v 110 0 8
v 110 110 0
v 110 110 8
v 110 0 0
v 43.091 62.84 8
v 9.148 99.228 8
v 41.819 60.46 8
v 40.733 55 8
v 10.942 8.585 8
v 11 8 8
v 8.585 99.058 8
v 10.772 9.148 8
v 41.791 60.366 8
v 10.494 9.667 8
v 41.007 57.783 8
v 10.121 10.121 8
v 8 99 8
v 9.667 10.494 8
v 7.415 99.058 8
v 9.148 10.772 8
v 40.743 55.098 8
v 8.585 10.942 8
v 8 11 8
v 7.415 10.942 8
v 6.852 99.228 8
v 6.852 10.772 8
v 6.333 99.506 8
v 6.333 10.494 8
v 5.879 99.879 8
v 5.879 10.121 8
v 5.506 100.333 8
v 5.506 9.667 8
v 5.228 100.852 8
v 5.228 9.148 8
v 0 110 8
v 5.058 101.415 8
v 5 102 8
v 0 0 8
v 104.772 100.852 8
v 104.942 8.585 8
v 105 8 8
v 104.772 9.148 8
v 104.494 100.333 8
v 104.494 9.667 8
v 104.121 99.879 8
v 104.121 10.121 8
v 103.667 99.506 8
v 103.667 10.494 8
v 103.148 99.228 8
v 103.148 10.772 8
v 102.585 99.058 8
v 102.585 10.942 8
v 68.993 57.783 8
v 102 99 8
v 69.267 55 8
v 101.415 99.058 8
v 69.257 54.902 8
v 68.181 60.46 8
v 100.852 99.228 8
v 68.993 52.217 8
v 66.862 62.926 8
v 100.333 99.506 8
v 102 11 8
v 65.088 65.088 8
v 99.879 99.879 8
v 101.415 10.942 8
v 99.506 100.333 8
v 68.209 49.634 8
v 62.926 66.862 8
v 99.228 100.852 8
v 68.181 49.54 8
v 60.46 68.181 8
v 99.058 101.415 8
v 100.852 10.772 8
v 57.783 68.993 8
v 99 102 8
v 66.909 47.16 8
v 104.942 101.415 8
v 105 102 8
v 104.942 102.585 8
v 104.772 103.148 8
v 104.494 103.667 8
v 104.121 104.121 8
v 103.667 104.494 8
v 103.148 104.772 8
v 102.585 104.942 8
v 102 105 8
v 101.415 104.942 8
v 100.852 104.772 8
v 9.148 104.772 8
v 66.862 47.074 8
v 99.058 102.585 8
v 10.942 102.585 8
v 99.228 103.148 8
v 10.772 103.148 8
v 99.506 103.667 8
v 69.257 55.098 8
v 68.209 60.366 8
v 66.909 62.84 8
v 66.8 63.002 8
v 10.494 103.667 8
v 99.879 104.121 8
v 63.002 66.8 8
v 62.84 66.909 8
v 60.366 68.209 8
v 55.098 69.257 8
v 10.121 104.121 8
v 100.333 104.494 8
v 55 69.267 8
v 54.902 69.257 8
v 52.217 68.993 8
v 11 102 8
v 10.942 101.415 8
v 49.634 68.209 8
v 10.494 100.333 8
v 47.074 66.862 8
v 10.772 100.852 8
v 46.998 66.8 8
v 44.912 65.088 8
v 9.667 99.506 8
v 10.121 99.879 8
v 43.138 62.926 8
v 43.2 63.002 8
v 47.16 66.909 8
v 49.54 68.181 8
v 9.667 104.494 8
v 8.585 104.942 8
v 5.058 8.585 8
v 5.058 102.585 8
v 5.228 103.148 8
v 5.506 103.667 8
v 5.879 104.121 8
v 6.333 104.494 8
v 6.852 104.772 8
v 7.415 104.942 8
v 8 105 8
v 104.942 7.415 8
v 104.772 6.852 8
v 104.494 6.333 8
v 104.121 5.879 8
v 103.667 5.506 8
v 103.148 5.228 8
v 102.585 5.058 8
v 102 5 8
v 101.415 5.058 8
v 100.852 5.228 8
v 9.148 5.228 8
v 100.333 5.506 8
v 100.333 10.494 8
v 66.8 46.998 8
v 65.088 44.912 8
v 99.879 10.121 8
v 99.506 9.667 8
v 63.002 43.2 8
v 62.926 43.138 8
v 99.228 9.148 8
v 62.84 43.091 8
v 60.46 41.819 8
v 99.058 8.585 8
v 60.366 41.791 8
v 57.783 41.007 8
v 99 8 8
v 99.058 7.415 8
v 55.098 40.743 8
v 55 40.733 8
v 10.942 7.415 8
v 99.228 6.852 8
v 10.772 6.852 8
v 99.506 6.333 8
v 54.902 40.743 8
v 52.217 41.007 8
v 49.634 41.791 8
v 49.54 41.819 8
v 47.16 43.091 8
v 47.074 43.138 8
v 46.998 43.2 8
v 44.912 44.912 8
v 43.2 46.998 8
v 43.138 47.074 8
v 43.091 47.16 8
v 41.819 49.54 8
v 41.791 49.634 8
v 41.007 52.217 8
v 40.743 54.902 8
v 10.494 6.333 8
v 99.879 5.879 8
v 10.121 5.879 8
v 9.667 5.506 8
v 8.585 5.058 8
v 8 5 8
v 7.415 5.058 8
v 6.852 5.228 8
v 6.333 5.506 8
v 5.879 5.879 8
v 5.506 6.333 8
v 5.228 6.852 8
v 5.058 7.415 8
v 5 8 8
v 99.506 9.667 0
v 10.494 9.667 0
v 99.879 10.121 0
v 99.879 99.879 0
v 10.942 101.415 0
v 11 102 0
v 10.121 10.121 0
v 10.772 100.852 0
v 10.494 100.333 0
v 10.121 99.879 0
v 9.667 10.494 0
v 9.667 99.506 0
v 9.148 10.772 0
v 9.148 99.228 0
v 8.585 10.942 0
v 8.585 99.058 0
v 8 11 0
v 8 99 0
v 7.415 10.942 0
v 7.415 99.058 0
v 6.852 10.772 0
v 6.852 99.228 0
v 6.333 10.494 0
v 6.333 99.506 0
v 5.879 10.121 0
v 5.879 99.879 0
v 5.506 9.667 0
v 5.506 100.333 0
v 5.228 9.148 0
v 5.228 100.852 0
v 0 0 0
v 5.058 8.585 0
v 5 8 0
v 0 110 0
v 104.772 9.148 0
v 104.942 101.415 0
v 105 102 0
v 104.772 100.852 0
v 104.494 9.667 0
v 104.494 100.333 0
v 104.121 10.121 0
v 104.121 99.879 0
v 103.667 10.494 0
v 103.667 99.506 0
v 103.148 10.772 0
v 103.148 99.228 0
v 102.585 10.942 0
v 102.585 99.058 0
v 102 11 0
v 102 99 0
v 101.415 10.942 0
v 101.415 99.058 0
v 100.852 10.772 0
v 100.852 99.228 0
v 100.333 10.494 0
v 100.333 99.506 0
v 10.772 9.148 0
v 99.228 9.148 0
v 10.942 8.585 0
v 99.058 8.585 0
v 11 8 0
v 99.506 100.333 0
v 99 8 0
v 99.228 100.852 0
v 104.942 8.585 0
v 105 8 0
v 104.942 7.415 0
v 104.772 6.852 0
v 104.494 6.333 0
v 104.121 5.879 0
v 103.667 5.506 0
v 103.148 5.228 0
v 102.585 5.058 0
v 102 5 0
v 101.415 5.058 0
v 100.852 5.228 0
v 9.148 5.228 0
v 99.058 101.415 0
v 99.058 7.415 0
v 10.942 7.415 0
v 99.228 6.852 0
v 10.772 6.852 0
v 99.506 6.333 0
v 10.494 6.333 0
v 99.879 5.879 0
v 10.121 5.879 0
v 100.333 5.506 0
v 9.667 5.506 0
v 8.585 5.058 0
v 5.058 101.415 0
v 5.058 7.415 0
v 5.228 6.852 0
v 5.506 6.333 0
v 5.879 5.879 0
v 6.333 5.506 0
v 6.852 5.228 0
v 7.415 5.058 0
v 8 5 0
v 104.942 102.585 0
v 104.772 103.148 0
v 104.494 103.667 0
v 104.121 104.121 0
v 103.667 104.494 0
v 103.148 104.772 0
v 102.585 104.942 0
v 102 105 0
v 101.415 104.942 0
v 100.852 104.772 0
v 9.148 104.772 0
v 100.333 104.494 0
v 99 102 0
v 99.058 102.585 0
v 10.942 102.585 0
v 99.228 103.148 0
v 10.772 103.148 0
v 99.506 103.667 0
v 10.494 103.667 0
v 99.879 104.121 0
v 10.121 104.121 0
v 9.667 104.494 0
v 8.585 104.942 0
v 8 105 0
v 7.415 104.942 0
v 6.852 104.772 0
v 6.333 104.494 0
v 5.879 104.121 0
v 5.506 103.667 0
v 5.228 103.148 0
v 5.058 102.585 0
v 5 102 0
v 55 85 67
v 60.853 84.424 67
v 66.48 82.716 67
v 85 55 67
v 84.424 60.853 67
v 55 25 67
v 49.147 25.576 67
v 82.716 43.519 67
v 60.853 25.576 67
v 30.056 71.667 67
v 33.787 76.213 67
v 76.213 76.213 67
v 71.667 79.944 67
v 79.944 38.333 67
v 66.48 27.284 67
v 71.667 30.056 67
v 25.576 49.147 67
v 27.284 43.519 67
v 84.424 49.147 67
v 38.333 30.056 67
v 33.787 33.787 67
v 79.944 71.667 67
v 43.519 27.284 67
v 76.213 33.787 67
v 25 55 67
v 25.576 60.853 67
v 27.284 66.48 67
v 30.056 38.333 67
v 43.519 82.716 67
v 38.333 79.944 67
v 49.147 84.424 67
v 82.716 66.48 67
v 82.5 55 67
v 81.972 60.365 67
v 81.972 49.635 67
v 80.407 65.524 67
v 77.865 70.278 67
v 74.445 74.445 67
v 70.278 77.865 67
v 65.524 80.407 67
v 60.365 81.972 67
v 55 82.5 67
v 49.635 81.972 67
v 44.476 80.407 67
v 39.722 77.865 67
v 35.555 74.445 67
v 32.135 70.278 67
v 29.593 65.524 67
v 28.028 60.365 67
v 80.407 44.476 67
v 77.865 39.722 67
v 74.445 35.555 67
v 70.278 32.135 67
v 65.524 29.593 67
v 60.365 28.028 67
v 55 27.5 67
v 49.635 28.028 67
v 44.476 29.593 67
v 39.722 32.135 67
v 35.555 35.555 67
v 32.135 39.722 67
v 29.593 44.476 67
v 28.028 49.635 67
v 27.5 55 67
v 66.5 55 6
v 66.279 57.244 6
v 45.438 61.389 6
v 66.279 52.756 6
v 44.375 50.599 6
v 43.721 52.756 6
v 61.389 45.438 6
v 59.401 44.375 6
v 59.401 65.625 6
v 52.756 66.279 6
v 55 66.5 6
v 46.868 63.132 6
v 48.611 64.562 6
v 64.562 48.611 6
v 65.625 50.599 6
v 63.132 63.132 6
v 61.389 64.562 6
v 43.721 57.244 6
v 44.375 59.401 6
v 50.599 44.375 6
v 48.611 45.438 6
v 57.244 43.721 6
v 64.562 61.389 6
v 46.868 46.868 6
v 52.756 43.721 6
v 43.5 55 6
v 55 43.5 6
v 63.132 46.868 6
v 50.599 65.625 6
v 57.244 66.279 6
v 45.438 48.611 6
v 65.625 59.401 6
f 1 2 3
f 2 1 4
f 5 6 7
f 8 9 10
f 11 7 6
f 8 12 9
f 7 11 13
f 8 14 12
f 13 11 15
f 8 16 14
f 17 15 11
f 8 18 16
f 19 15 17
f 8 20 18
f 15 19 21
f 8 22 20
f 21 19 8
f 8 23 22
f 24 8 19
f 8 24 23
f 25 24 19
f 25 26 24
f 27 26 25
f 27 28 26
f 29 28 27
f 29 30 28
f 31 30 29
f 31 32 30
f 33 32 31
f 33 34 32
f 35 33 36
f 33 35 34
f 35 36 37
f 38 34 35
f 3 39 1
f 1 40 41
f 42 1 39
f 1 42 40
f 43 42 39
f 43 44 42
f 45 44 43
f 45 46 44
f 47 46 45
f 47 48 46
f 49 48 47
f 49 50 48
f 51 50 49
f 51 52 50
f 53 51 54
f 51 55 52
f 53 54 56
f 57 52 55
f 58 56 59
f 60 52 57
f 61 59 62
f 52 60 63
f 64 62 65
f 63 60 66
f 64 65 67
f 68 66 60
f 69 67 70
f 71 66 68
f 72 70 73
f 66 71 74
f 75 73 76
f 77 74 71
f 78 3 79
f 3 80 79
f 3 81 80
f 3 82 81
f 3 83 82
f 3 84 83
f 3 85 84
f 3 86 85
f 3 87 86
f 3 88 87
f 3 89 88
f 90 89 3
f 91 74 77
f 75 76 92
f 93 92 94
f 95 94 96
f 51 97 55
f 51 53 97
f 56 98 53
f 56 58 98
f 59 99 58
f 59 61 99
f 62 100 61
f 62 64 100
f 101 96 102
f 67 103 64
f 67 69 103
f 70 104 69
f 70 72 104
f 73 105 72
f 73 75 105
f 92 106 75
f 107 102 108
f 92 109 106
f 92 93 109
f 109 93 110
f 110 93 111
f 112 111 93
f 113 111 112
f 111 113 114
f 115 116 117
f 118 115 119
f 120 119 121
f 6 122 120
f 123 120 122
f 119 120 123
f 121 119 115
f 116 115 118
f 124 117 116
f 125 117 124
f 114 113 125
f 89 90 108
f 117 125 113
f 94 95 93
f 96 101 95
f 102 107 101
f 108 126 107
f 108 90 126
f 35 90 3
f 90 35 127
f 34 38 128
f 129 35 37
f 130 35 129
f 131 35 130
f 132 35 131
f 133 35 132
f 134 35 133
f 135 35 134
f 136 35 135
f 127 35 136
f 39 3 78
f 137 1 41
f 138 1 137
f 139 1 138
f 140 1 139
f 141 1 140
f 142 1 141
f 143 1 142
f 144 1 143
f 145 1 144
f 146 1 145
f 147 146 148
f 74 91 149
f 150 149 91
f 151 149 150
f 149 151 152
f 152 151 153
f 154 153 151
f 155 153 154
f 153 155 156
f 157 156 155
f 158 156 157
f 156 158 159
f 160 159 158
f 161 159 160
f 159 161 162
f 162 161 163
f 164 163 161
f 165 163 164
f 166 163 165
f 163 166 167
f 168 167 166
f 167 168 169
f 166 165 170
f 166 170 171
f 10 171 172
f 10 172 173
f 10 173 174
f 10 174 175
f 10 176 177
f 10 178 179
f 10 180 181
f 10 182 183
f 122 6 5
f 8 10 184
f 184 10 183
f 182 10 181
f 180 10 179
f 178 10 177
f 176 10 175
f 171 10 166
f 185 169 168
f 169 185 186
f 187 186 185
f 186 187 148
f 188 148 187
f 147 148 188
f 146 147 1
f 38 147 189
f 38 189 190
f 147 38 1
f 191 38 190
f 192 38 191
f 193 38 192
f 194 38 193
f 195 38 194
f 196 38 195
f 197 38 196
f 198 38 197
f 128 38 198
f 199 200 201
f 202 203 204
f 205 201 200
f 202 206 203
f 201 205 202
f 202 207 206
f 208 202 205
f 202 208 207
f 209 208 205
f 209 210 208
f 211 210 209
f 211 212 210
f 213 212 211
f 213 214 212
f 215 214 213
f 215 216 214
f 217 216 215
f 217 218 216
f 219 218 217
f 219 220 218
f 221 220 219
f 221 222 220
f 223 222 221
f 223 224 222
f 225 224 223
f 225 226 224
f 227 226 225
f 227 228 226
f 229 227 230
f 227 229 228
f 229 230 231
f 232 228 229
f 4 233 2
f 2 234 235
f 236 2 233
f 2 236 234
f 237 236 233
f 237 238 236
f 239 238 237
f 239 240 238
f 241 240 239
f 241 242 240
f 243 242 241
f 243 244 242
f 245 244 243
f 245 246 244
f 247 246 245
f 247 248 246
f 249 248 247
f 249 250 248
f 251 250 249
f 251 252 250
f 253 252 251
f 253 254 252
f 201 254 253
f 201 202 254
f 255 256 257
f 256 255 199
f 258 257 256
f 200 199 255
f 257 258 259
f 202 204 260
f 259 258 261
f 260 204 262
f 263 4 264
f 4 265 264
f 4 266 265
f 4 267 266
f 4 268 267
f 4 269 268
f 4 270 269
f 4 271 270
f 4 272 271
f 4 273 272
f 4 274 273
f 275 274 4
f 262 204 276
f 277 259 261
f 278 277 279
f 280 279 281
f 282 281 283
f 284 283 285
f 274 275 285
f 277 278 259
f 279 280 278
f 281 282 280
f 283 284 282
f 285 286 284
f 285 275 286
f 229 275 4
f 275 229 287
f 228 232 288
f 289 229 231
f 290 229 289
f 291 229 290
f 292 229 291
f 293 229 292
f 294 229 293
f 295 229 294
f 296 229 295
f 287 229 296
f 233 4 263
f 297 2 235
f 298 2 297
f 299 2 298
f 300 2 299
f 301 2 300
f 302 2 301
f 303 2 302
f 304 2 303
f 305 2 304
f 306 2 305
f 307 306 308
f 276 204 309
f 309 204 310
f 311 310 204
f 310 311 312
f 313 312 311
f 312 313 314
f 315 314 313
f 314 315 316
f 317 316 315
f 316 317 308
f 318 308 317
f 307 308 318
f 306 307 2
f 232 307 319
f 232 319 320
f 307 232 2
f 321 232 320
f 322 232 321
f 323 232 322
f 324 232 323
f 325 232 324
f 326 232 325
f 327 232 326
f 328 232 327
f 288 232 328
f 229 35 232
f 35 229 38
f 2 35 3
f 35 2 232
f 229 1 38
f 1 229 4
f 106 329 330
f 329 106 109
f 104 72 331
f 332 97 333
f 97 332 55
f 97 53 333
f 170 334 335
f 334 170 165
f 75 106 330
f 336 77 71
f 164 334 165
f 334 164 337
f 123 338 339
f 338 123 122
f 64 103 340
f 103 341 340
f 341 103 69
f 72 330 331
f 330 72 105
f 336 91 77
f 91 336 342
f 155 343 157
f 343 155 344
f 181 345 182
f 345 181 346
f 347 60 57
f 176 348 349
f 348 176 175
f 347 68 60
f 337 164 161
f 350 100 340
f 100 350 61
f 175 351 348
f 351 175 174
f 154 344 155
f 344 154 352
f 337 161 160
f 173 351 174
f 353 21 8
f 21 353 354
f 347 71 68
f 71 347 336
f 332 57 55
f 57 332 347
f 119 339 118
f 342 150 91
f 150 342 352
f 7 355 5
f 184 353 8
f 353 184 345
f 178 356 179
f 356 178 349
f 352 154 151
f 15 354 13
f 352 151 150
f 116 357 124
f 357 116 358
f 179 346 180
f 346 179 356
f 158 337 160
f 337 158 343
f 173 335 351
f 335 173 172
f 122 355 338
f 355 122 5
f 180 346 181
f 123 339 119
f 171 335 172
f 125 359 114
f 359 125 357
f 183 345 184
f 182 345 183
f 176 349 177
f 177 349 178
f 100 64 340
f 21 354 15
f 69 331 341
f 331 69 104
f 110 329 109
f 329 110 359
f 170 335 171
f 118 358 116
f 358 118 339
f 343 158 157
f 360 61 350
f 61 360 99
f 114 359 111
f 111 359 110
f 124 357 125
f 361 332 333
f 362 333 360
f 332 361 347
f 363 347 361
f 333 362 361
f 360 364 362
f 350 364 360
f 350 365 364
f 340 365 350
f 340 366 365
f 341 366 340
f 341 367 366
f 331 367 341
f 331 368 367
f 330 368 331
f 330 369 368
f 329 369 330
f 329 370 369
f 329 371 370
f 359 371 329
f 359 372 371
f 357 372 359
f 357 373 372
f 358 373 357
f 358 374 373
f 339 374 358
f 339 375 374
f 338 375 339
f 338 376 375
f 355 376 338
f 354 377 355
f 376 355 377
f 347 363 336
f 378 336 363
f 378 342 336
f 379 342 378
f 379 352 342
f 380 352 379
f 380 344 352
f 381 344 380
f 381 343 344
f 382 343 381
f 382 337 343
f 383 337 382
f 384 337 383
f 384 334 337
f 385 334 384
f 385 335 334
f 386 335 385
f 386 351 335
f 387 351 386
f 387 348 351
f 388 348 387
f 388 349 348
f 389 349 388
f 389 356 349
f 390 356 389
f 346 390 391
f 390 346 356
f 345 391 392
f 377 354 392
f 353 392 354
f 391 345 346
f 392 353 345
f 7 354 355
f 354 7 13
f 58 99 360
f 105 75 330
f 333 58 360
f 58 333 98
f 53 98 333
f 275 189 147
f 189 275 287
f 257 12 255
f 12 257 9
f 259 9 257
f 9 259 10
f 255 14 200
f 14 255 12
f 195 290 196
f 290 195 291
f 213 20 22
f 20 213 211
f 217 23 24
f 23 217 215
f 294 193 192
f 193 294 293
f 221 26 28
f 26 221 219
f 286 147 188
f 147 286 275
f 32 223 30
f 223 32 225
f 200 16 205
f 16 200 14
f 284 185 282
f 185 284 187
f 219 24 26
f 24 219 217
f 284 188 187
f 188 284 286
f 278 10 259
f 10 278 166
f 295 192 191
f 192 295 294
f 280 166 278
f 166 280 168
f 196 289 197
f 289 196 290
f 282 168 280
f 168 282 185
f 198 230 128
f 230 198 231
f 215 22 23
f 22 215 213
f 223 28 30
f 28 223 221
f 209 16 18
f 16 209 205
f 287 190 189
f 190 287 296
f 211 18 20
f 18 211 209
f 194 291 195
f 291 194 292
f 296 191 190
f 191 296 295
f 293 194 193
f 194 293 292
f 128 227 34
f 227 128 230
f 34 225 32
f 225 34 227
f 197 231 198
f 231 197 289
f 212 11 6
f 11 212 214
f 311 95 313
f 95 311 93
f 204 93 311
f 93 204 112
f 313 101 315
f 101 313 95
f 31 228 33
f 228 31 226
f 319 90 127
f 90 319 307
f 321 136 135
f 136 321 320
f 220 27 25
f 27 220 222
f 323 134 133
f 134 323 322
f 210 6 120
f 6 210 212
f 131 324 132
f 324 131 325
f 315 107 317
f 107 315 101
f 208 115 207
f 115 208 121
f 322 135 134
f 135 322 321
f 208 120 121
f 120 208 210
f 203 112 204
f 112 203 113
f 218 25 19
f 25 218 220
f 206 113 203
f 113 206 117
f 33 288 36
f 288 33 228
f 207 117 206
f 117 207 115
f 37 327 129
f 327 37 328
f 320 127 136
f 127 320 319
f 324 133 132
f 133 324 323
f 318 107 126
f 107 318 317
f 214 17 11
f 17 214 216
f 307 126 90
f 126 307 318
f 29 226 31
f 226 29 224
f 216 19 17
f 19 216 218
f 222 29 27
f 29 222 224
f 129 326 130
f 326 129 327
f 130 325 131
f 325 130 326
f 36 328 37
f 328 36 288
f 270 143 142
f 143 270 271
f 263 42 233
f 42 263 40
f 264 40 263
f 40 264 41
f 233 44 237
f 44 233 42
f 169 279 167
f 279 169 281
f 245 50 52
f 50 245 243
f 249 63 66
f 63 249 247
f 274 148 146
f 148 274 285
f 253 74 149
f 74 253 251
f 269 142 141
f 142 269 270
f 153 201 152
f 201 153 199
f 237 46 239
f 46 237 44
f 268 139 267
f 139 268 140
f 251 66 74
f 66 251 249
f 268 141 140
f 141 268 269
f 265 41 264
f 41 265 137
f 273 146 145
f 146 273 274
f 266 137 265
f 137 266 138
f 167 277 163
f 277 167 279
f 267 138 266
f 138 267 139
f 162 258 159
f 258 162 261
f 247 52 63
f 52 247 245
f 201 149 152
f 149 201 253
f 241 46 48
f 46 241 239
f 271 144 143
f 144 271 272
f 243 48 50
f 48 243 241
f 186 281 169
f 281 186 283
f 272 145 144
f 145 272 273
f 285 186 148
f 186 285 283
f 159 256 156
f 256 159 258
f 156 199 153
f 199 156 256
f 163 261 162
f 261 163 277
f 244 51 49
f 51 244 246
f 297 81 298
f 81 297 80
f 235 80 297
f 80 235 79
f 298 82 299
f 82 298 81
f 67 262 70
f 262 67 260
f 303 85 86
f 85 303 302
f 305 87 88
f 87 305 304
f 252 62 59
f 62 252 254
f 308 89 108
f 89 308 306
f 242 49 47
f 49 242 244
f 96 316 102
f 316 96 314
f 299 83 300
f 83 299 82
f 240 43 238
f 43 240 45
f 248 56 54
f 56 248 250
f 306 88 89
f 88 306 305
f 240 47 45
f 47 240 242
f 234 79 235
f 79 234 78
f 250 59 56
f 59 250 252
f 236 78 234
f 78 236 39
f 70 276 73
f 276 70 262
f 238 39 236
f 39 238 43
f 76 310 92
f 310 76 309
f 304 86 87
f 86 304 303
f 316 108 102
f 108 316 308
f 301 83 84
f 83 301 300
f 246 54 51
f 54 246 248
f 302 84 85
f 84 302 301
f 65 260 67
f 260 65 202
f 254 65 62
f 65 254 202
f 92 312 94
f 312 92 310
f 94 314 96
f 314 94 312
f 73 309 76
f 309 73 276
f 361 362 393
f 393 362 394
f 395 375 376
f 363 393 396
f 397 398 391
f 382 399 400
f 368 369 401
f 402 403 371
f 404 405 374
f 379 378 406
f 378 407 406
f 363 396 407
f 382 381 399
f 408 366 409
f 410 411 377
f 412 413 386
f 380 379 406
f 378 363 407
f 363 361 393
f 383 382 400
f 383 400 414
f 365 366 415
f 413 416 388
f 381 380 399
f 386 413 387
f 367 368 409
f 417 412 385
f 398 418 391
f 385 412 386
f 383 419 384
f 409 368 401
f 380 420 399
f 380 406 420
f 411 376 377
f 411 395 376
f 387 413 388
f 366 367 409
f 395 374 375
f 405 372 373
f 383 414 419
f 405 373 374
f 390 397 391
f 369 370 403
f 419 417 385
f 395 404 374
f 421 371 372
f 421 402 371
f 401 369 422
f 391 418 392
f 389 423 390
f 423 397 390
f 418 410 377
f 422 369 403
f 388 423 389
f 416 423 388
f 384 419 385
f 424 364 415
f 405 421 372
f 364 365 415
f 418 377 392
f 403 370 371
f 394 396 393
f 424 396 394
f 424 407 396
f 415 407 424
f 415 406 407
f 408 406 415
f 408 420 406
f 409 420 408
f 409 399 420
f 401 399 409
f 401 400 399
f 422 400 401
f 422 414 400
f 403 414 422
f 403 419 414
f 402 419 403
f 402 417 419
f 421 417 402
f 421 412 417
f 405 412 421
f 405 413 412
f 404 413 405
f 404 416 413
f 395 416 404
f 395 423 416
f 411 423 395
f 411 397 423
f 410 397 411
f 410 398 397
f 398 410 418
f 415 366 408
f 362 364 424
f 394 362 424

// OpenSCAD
$fn = 32;

// ----------------------------------------------------------------------
// Hopper: flanged with square flange
// ----------------------------------------------------------------------

// --- parameters (mm) ---
fl = 110;                 // flange side, X and Y
fl_t = 8;                 // flange thickness
cone_h = 60;              // cone height above the flange
top_d = 60;               // cone mouth diameter
bot_d = 28;               // cone spout diameter
wall = 2.5;               // cone wall thickness
hole_r = 3;               // flange hole radius
hole_in = 8;              // hole inset from the corners
fit_tol = 0.1;            // tolerance for press fits, mm
free_tol = 0.5;           // tolerance for clearance fits, mm

bore_d = bot_d - 2 * wall;  // spout bore diameter
total_h = fl_t + cone_h - 1;  // overall height

difference() {
  union() {
    cube([fl, fl, fl_t]);
    translate([fl / 2, fl / 2, fl_t - 1])
      cylinder(h = cone_h, d1 = bot_d, d2 = top_d);
  }
  translate([fl / 2, fl / 2, fl_t - 2])
    cylinder(h = cone_h + 1, d1 = bore_d, d2 = top_d - 2 * wall);
  for (sx = [0, 1], sy = [0, 1])
    translate([sx ? fl - hole_in : hole_in,
               sy ? fl - hole_in : hole_in, -1])
      cylinder(r = hole_r, h = fl_t + 2);
}
